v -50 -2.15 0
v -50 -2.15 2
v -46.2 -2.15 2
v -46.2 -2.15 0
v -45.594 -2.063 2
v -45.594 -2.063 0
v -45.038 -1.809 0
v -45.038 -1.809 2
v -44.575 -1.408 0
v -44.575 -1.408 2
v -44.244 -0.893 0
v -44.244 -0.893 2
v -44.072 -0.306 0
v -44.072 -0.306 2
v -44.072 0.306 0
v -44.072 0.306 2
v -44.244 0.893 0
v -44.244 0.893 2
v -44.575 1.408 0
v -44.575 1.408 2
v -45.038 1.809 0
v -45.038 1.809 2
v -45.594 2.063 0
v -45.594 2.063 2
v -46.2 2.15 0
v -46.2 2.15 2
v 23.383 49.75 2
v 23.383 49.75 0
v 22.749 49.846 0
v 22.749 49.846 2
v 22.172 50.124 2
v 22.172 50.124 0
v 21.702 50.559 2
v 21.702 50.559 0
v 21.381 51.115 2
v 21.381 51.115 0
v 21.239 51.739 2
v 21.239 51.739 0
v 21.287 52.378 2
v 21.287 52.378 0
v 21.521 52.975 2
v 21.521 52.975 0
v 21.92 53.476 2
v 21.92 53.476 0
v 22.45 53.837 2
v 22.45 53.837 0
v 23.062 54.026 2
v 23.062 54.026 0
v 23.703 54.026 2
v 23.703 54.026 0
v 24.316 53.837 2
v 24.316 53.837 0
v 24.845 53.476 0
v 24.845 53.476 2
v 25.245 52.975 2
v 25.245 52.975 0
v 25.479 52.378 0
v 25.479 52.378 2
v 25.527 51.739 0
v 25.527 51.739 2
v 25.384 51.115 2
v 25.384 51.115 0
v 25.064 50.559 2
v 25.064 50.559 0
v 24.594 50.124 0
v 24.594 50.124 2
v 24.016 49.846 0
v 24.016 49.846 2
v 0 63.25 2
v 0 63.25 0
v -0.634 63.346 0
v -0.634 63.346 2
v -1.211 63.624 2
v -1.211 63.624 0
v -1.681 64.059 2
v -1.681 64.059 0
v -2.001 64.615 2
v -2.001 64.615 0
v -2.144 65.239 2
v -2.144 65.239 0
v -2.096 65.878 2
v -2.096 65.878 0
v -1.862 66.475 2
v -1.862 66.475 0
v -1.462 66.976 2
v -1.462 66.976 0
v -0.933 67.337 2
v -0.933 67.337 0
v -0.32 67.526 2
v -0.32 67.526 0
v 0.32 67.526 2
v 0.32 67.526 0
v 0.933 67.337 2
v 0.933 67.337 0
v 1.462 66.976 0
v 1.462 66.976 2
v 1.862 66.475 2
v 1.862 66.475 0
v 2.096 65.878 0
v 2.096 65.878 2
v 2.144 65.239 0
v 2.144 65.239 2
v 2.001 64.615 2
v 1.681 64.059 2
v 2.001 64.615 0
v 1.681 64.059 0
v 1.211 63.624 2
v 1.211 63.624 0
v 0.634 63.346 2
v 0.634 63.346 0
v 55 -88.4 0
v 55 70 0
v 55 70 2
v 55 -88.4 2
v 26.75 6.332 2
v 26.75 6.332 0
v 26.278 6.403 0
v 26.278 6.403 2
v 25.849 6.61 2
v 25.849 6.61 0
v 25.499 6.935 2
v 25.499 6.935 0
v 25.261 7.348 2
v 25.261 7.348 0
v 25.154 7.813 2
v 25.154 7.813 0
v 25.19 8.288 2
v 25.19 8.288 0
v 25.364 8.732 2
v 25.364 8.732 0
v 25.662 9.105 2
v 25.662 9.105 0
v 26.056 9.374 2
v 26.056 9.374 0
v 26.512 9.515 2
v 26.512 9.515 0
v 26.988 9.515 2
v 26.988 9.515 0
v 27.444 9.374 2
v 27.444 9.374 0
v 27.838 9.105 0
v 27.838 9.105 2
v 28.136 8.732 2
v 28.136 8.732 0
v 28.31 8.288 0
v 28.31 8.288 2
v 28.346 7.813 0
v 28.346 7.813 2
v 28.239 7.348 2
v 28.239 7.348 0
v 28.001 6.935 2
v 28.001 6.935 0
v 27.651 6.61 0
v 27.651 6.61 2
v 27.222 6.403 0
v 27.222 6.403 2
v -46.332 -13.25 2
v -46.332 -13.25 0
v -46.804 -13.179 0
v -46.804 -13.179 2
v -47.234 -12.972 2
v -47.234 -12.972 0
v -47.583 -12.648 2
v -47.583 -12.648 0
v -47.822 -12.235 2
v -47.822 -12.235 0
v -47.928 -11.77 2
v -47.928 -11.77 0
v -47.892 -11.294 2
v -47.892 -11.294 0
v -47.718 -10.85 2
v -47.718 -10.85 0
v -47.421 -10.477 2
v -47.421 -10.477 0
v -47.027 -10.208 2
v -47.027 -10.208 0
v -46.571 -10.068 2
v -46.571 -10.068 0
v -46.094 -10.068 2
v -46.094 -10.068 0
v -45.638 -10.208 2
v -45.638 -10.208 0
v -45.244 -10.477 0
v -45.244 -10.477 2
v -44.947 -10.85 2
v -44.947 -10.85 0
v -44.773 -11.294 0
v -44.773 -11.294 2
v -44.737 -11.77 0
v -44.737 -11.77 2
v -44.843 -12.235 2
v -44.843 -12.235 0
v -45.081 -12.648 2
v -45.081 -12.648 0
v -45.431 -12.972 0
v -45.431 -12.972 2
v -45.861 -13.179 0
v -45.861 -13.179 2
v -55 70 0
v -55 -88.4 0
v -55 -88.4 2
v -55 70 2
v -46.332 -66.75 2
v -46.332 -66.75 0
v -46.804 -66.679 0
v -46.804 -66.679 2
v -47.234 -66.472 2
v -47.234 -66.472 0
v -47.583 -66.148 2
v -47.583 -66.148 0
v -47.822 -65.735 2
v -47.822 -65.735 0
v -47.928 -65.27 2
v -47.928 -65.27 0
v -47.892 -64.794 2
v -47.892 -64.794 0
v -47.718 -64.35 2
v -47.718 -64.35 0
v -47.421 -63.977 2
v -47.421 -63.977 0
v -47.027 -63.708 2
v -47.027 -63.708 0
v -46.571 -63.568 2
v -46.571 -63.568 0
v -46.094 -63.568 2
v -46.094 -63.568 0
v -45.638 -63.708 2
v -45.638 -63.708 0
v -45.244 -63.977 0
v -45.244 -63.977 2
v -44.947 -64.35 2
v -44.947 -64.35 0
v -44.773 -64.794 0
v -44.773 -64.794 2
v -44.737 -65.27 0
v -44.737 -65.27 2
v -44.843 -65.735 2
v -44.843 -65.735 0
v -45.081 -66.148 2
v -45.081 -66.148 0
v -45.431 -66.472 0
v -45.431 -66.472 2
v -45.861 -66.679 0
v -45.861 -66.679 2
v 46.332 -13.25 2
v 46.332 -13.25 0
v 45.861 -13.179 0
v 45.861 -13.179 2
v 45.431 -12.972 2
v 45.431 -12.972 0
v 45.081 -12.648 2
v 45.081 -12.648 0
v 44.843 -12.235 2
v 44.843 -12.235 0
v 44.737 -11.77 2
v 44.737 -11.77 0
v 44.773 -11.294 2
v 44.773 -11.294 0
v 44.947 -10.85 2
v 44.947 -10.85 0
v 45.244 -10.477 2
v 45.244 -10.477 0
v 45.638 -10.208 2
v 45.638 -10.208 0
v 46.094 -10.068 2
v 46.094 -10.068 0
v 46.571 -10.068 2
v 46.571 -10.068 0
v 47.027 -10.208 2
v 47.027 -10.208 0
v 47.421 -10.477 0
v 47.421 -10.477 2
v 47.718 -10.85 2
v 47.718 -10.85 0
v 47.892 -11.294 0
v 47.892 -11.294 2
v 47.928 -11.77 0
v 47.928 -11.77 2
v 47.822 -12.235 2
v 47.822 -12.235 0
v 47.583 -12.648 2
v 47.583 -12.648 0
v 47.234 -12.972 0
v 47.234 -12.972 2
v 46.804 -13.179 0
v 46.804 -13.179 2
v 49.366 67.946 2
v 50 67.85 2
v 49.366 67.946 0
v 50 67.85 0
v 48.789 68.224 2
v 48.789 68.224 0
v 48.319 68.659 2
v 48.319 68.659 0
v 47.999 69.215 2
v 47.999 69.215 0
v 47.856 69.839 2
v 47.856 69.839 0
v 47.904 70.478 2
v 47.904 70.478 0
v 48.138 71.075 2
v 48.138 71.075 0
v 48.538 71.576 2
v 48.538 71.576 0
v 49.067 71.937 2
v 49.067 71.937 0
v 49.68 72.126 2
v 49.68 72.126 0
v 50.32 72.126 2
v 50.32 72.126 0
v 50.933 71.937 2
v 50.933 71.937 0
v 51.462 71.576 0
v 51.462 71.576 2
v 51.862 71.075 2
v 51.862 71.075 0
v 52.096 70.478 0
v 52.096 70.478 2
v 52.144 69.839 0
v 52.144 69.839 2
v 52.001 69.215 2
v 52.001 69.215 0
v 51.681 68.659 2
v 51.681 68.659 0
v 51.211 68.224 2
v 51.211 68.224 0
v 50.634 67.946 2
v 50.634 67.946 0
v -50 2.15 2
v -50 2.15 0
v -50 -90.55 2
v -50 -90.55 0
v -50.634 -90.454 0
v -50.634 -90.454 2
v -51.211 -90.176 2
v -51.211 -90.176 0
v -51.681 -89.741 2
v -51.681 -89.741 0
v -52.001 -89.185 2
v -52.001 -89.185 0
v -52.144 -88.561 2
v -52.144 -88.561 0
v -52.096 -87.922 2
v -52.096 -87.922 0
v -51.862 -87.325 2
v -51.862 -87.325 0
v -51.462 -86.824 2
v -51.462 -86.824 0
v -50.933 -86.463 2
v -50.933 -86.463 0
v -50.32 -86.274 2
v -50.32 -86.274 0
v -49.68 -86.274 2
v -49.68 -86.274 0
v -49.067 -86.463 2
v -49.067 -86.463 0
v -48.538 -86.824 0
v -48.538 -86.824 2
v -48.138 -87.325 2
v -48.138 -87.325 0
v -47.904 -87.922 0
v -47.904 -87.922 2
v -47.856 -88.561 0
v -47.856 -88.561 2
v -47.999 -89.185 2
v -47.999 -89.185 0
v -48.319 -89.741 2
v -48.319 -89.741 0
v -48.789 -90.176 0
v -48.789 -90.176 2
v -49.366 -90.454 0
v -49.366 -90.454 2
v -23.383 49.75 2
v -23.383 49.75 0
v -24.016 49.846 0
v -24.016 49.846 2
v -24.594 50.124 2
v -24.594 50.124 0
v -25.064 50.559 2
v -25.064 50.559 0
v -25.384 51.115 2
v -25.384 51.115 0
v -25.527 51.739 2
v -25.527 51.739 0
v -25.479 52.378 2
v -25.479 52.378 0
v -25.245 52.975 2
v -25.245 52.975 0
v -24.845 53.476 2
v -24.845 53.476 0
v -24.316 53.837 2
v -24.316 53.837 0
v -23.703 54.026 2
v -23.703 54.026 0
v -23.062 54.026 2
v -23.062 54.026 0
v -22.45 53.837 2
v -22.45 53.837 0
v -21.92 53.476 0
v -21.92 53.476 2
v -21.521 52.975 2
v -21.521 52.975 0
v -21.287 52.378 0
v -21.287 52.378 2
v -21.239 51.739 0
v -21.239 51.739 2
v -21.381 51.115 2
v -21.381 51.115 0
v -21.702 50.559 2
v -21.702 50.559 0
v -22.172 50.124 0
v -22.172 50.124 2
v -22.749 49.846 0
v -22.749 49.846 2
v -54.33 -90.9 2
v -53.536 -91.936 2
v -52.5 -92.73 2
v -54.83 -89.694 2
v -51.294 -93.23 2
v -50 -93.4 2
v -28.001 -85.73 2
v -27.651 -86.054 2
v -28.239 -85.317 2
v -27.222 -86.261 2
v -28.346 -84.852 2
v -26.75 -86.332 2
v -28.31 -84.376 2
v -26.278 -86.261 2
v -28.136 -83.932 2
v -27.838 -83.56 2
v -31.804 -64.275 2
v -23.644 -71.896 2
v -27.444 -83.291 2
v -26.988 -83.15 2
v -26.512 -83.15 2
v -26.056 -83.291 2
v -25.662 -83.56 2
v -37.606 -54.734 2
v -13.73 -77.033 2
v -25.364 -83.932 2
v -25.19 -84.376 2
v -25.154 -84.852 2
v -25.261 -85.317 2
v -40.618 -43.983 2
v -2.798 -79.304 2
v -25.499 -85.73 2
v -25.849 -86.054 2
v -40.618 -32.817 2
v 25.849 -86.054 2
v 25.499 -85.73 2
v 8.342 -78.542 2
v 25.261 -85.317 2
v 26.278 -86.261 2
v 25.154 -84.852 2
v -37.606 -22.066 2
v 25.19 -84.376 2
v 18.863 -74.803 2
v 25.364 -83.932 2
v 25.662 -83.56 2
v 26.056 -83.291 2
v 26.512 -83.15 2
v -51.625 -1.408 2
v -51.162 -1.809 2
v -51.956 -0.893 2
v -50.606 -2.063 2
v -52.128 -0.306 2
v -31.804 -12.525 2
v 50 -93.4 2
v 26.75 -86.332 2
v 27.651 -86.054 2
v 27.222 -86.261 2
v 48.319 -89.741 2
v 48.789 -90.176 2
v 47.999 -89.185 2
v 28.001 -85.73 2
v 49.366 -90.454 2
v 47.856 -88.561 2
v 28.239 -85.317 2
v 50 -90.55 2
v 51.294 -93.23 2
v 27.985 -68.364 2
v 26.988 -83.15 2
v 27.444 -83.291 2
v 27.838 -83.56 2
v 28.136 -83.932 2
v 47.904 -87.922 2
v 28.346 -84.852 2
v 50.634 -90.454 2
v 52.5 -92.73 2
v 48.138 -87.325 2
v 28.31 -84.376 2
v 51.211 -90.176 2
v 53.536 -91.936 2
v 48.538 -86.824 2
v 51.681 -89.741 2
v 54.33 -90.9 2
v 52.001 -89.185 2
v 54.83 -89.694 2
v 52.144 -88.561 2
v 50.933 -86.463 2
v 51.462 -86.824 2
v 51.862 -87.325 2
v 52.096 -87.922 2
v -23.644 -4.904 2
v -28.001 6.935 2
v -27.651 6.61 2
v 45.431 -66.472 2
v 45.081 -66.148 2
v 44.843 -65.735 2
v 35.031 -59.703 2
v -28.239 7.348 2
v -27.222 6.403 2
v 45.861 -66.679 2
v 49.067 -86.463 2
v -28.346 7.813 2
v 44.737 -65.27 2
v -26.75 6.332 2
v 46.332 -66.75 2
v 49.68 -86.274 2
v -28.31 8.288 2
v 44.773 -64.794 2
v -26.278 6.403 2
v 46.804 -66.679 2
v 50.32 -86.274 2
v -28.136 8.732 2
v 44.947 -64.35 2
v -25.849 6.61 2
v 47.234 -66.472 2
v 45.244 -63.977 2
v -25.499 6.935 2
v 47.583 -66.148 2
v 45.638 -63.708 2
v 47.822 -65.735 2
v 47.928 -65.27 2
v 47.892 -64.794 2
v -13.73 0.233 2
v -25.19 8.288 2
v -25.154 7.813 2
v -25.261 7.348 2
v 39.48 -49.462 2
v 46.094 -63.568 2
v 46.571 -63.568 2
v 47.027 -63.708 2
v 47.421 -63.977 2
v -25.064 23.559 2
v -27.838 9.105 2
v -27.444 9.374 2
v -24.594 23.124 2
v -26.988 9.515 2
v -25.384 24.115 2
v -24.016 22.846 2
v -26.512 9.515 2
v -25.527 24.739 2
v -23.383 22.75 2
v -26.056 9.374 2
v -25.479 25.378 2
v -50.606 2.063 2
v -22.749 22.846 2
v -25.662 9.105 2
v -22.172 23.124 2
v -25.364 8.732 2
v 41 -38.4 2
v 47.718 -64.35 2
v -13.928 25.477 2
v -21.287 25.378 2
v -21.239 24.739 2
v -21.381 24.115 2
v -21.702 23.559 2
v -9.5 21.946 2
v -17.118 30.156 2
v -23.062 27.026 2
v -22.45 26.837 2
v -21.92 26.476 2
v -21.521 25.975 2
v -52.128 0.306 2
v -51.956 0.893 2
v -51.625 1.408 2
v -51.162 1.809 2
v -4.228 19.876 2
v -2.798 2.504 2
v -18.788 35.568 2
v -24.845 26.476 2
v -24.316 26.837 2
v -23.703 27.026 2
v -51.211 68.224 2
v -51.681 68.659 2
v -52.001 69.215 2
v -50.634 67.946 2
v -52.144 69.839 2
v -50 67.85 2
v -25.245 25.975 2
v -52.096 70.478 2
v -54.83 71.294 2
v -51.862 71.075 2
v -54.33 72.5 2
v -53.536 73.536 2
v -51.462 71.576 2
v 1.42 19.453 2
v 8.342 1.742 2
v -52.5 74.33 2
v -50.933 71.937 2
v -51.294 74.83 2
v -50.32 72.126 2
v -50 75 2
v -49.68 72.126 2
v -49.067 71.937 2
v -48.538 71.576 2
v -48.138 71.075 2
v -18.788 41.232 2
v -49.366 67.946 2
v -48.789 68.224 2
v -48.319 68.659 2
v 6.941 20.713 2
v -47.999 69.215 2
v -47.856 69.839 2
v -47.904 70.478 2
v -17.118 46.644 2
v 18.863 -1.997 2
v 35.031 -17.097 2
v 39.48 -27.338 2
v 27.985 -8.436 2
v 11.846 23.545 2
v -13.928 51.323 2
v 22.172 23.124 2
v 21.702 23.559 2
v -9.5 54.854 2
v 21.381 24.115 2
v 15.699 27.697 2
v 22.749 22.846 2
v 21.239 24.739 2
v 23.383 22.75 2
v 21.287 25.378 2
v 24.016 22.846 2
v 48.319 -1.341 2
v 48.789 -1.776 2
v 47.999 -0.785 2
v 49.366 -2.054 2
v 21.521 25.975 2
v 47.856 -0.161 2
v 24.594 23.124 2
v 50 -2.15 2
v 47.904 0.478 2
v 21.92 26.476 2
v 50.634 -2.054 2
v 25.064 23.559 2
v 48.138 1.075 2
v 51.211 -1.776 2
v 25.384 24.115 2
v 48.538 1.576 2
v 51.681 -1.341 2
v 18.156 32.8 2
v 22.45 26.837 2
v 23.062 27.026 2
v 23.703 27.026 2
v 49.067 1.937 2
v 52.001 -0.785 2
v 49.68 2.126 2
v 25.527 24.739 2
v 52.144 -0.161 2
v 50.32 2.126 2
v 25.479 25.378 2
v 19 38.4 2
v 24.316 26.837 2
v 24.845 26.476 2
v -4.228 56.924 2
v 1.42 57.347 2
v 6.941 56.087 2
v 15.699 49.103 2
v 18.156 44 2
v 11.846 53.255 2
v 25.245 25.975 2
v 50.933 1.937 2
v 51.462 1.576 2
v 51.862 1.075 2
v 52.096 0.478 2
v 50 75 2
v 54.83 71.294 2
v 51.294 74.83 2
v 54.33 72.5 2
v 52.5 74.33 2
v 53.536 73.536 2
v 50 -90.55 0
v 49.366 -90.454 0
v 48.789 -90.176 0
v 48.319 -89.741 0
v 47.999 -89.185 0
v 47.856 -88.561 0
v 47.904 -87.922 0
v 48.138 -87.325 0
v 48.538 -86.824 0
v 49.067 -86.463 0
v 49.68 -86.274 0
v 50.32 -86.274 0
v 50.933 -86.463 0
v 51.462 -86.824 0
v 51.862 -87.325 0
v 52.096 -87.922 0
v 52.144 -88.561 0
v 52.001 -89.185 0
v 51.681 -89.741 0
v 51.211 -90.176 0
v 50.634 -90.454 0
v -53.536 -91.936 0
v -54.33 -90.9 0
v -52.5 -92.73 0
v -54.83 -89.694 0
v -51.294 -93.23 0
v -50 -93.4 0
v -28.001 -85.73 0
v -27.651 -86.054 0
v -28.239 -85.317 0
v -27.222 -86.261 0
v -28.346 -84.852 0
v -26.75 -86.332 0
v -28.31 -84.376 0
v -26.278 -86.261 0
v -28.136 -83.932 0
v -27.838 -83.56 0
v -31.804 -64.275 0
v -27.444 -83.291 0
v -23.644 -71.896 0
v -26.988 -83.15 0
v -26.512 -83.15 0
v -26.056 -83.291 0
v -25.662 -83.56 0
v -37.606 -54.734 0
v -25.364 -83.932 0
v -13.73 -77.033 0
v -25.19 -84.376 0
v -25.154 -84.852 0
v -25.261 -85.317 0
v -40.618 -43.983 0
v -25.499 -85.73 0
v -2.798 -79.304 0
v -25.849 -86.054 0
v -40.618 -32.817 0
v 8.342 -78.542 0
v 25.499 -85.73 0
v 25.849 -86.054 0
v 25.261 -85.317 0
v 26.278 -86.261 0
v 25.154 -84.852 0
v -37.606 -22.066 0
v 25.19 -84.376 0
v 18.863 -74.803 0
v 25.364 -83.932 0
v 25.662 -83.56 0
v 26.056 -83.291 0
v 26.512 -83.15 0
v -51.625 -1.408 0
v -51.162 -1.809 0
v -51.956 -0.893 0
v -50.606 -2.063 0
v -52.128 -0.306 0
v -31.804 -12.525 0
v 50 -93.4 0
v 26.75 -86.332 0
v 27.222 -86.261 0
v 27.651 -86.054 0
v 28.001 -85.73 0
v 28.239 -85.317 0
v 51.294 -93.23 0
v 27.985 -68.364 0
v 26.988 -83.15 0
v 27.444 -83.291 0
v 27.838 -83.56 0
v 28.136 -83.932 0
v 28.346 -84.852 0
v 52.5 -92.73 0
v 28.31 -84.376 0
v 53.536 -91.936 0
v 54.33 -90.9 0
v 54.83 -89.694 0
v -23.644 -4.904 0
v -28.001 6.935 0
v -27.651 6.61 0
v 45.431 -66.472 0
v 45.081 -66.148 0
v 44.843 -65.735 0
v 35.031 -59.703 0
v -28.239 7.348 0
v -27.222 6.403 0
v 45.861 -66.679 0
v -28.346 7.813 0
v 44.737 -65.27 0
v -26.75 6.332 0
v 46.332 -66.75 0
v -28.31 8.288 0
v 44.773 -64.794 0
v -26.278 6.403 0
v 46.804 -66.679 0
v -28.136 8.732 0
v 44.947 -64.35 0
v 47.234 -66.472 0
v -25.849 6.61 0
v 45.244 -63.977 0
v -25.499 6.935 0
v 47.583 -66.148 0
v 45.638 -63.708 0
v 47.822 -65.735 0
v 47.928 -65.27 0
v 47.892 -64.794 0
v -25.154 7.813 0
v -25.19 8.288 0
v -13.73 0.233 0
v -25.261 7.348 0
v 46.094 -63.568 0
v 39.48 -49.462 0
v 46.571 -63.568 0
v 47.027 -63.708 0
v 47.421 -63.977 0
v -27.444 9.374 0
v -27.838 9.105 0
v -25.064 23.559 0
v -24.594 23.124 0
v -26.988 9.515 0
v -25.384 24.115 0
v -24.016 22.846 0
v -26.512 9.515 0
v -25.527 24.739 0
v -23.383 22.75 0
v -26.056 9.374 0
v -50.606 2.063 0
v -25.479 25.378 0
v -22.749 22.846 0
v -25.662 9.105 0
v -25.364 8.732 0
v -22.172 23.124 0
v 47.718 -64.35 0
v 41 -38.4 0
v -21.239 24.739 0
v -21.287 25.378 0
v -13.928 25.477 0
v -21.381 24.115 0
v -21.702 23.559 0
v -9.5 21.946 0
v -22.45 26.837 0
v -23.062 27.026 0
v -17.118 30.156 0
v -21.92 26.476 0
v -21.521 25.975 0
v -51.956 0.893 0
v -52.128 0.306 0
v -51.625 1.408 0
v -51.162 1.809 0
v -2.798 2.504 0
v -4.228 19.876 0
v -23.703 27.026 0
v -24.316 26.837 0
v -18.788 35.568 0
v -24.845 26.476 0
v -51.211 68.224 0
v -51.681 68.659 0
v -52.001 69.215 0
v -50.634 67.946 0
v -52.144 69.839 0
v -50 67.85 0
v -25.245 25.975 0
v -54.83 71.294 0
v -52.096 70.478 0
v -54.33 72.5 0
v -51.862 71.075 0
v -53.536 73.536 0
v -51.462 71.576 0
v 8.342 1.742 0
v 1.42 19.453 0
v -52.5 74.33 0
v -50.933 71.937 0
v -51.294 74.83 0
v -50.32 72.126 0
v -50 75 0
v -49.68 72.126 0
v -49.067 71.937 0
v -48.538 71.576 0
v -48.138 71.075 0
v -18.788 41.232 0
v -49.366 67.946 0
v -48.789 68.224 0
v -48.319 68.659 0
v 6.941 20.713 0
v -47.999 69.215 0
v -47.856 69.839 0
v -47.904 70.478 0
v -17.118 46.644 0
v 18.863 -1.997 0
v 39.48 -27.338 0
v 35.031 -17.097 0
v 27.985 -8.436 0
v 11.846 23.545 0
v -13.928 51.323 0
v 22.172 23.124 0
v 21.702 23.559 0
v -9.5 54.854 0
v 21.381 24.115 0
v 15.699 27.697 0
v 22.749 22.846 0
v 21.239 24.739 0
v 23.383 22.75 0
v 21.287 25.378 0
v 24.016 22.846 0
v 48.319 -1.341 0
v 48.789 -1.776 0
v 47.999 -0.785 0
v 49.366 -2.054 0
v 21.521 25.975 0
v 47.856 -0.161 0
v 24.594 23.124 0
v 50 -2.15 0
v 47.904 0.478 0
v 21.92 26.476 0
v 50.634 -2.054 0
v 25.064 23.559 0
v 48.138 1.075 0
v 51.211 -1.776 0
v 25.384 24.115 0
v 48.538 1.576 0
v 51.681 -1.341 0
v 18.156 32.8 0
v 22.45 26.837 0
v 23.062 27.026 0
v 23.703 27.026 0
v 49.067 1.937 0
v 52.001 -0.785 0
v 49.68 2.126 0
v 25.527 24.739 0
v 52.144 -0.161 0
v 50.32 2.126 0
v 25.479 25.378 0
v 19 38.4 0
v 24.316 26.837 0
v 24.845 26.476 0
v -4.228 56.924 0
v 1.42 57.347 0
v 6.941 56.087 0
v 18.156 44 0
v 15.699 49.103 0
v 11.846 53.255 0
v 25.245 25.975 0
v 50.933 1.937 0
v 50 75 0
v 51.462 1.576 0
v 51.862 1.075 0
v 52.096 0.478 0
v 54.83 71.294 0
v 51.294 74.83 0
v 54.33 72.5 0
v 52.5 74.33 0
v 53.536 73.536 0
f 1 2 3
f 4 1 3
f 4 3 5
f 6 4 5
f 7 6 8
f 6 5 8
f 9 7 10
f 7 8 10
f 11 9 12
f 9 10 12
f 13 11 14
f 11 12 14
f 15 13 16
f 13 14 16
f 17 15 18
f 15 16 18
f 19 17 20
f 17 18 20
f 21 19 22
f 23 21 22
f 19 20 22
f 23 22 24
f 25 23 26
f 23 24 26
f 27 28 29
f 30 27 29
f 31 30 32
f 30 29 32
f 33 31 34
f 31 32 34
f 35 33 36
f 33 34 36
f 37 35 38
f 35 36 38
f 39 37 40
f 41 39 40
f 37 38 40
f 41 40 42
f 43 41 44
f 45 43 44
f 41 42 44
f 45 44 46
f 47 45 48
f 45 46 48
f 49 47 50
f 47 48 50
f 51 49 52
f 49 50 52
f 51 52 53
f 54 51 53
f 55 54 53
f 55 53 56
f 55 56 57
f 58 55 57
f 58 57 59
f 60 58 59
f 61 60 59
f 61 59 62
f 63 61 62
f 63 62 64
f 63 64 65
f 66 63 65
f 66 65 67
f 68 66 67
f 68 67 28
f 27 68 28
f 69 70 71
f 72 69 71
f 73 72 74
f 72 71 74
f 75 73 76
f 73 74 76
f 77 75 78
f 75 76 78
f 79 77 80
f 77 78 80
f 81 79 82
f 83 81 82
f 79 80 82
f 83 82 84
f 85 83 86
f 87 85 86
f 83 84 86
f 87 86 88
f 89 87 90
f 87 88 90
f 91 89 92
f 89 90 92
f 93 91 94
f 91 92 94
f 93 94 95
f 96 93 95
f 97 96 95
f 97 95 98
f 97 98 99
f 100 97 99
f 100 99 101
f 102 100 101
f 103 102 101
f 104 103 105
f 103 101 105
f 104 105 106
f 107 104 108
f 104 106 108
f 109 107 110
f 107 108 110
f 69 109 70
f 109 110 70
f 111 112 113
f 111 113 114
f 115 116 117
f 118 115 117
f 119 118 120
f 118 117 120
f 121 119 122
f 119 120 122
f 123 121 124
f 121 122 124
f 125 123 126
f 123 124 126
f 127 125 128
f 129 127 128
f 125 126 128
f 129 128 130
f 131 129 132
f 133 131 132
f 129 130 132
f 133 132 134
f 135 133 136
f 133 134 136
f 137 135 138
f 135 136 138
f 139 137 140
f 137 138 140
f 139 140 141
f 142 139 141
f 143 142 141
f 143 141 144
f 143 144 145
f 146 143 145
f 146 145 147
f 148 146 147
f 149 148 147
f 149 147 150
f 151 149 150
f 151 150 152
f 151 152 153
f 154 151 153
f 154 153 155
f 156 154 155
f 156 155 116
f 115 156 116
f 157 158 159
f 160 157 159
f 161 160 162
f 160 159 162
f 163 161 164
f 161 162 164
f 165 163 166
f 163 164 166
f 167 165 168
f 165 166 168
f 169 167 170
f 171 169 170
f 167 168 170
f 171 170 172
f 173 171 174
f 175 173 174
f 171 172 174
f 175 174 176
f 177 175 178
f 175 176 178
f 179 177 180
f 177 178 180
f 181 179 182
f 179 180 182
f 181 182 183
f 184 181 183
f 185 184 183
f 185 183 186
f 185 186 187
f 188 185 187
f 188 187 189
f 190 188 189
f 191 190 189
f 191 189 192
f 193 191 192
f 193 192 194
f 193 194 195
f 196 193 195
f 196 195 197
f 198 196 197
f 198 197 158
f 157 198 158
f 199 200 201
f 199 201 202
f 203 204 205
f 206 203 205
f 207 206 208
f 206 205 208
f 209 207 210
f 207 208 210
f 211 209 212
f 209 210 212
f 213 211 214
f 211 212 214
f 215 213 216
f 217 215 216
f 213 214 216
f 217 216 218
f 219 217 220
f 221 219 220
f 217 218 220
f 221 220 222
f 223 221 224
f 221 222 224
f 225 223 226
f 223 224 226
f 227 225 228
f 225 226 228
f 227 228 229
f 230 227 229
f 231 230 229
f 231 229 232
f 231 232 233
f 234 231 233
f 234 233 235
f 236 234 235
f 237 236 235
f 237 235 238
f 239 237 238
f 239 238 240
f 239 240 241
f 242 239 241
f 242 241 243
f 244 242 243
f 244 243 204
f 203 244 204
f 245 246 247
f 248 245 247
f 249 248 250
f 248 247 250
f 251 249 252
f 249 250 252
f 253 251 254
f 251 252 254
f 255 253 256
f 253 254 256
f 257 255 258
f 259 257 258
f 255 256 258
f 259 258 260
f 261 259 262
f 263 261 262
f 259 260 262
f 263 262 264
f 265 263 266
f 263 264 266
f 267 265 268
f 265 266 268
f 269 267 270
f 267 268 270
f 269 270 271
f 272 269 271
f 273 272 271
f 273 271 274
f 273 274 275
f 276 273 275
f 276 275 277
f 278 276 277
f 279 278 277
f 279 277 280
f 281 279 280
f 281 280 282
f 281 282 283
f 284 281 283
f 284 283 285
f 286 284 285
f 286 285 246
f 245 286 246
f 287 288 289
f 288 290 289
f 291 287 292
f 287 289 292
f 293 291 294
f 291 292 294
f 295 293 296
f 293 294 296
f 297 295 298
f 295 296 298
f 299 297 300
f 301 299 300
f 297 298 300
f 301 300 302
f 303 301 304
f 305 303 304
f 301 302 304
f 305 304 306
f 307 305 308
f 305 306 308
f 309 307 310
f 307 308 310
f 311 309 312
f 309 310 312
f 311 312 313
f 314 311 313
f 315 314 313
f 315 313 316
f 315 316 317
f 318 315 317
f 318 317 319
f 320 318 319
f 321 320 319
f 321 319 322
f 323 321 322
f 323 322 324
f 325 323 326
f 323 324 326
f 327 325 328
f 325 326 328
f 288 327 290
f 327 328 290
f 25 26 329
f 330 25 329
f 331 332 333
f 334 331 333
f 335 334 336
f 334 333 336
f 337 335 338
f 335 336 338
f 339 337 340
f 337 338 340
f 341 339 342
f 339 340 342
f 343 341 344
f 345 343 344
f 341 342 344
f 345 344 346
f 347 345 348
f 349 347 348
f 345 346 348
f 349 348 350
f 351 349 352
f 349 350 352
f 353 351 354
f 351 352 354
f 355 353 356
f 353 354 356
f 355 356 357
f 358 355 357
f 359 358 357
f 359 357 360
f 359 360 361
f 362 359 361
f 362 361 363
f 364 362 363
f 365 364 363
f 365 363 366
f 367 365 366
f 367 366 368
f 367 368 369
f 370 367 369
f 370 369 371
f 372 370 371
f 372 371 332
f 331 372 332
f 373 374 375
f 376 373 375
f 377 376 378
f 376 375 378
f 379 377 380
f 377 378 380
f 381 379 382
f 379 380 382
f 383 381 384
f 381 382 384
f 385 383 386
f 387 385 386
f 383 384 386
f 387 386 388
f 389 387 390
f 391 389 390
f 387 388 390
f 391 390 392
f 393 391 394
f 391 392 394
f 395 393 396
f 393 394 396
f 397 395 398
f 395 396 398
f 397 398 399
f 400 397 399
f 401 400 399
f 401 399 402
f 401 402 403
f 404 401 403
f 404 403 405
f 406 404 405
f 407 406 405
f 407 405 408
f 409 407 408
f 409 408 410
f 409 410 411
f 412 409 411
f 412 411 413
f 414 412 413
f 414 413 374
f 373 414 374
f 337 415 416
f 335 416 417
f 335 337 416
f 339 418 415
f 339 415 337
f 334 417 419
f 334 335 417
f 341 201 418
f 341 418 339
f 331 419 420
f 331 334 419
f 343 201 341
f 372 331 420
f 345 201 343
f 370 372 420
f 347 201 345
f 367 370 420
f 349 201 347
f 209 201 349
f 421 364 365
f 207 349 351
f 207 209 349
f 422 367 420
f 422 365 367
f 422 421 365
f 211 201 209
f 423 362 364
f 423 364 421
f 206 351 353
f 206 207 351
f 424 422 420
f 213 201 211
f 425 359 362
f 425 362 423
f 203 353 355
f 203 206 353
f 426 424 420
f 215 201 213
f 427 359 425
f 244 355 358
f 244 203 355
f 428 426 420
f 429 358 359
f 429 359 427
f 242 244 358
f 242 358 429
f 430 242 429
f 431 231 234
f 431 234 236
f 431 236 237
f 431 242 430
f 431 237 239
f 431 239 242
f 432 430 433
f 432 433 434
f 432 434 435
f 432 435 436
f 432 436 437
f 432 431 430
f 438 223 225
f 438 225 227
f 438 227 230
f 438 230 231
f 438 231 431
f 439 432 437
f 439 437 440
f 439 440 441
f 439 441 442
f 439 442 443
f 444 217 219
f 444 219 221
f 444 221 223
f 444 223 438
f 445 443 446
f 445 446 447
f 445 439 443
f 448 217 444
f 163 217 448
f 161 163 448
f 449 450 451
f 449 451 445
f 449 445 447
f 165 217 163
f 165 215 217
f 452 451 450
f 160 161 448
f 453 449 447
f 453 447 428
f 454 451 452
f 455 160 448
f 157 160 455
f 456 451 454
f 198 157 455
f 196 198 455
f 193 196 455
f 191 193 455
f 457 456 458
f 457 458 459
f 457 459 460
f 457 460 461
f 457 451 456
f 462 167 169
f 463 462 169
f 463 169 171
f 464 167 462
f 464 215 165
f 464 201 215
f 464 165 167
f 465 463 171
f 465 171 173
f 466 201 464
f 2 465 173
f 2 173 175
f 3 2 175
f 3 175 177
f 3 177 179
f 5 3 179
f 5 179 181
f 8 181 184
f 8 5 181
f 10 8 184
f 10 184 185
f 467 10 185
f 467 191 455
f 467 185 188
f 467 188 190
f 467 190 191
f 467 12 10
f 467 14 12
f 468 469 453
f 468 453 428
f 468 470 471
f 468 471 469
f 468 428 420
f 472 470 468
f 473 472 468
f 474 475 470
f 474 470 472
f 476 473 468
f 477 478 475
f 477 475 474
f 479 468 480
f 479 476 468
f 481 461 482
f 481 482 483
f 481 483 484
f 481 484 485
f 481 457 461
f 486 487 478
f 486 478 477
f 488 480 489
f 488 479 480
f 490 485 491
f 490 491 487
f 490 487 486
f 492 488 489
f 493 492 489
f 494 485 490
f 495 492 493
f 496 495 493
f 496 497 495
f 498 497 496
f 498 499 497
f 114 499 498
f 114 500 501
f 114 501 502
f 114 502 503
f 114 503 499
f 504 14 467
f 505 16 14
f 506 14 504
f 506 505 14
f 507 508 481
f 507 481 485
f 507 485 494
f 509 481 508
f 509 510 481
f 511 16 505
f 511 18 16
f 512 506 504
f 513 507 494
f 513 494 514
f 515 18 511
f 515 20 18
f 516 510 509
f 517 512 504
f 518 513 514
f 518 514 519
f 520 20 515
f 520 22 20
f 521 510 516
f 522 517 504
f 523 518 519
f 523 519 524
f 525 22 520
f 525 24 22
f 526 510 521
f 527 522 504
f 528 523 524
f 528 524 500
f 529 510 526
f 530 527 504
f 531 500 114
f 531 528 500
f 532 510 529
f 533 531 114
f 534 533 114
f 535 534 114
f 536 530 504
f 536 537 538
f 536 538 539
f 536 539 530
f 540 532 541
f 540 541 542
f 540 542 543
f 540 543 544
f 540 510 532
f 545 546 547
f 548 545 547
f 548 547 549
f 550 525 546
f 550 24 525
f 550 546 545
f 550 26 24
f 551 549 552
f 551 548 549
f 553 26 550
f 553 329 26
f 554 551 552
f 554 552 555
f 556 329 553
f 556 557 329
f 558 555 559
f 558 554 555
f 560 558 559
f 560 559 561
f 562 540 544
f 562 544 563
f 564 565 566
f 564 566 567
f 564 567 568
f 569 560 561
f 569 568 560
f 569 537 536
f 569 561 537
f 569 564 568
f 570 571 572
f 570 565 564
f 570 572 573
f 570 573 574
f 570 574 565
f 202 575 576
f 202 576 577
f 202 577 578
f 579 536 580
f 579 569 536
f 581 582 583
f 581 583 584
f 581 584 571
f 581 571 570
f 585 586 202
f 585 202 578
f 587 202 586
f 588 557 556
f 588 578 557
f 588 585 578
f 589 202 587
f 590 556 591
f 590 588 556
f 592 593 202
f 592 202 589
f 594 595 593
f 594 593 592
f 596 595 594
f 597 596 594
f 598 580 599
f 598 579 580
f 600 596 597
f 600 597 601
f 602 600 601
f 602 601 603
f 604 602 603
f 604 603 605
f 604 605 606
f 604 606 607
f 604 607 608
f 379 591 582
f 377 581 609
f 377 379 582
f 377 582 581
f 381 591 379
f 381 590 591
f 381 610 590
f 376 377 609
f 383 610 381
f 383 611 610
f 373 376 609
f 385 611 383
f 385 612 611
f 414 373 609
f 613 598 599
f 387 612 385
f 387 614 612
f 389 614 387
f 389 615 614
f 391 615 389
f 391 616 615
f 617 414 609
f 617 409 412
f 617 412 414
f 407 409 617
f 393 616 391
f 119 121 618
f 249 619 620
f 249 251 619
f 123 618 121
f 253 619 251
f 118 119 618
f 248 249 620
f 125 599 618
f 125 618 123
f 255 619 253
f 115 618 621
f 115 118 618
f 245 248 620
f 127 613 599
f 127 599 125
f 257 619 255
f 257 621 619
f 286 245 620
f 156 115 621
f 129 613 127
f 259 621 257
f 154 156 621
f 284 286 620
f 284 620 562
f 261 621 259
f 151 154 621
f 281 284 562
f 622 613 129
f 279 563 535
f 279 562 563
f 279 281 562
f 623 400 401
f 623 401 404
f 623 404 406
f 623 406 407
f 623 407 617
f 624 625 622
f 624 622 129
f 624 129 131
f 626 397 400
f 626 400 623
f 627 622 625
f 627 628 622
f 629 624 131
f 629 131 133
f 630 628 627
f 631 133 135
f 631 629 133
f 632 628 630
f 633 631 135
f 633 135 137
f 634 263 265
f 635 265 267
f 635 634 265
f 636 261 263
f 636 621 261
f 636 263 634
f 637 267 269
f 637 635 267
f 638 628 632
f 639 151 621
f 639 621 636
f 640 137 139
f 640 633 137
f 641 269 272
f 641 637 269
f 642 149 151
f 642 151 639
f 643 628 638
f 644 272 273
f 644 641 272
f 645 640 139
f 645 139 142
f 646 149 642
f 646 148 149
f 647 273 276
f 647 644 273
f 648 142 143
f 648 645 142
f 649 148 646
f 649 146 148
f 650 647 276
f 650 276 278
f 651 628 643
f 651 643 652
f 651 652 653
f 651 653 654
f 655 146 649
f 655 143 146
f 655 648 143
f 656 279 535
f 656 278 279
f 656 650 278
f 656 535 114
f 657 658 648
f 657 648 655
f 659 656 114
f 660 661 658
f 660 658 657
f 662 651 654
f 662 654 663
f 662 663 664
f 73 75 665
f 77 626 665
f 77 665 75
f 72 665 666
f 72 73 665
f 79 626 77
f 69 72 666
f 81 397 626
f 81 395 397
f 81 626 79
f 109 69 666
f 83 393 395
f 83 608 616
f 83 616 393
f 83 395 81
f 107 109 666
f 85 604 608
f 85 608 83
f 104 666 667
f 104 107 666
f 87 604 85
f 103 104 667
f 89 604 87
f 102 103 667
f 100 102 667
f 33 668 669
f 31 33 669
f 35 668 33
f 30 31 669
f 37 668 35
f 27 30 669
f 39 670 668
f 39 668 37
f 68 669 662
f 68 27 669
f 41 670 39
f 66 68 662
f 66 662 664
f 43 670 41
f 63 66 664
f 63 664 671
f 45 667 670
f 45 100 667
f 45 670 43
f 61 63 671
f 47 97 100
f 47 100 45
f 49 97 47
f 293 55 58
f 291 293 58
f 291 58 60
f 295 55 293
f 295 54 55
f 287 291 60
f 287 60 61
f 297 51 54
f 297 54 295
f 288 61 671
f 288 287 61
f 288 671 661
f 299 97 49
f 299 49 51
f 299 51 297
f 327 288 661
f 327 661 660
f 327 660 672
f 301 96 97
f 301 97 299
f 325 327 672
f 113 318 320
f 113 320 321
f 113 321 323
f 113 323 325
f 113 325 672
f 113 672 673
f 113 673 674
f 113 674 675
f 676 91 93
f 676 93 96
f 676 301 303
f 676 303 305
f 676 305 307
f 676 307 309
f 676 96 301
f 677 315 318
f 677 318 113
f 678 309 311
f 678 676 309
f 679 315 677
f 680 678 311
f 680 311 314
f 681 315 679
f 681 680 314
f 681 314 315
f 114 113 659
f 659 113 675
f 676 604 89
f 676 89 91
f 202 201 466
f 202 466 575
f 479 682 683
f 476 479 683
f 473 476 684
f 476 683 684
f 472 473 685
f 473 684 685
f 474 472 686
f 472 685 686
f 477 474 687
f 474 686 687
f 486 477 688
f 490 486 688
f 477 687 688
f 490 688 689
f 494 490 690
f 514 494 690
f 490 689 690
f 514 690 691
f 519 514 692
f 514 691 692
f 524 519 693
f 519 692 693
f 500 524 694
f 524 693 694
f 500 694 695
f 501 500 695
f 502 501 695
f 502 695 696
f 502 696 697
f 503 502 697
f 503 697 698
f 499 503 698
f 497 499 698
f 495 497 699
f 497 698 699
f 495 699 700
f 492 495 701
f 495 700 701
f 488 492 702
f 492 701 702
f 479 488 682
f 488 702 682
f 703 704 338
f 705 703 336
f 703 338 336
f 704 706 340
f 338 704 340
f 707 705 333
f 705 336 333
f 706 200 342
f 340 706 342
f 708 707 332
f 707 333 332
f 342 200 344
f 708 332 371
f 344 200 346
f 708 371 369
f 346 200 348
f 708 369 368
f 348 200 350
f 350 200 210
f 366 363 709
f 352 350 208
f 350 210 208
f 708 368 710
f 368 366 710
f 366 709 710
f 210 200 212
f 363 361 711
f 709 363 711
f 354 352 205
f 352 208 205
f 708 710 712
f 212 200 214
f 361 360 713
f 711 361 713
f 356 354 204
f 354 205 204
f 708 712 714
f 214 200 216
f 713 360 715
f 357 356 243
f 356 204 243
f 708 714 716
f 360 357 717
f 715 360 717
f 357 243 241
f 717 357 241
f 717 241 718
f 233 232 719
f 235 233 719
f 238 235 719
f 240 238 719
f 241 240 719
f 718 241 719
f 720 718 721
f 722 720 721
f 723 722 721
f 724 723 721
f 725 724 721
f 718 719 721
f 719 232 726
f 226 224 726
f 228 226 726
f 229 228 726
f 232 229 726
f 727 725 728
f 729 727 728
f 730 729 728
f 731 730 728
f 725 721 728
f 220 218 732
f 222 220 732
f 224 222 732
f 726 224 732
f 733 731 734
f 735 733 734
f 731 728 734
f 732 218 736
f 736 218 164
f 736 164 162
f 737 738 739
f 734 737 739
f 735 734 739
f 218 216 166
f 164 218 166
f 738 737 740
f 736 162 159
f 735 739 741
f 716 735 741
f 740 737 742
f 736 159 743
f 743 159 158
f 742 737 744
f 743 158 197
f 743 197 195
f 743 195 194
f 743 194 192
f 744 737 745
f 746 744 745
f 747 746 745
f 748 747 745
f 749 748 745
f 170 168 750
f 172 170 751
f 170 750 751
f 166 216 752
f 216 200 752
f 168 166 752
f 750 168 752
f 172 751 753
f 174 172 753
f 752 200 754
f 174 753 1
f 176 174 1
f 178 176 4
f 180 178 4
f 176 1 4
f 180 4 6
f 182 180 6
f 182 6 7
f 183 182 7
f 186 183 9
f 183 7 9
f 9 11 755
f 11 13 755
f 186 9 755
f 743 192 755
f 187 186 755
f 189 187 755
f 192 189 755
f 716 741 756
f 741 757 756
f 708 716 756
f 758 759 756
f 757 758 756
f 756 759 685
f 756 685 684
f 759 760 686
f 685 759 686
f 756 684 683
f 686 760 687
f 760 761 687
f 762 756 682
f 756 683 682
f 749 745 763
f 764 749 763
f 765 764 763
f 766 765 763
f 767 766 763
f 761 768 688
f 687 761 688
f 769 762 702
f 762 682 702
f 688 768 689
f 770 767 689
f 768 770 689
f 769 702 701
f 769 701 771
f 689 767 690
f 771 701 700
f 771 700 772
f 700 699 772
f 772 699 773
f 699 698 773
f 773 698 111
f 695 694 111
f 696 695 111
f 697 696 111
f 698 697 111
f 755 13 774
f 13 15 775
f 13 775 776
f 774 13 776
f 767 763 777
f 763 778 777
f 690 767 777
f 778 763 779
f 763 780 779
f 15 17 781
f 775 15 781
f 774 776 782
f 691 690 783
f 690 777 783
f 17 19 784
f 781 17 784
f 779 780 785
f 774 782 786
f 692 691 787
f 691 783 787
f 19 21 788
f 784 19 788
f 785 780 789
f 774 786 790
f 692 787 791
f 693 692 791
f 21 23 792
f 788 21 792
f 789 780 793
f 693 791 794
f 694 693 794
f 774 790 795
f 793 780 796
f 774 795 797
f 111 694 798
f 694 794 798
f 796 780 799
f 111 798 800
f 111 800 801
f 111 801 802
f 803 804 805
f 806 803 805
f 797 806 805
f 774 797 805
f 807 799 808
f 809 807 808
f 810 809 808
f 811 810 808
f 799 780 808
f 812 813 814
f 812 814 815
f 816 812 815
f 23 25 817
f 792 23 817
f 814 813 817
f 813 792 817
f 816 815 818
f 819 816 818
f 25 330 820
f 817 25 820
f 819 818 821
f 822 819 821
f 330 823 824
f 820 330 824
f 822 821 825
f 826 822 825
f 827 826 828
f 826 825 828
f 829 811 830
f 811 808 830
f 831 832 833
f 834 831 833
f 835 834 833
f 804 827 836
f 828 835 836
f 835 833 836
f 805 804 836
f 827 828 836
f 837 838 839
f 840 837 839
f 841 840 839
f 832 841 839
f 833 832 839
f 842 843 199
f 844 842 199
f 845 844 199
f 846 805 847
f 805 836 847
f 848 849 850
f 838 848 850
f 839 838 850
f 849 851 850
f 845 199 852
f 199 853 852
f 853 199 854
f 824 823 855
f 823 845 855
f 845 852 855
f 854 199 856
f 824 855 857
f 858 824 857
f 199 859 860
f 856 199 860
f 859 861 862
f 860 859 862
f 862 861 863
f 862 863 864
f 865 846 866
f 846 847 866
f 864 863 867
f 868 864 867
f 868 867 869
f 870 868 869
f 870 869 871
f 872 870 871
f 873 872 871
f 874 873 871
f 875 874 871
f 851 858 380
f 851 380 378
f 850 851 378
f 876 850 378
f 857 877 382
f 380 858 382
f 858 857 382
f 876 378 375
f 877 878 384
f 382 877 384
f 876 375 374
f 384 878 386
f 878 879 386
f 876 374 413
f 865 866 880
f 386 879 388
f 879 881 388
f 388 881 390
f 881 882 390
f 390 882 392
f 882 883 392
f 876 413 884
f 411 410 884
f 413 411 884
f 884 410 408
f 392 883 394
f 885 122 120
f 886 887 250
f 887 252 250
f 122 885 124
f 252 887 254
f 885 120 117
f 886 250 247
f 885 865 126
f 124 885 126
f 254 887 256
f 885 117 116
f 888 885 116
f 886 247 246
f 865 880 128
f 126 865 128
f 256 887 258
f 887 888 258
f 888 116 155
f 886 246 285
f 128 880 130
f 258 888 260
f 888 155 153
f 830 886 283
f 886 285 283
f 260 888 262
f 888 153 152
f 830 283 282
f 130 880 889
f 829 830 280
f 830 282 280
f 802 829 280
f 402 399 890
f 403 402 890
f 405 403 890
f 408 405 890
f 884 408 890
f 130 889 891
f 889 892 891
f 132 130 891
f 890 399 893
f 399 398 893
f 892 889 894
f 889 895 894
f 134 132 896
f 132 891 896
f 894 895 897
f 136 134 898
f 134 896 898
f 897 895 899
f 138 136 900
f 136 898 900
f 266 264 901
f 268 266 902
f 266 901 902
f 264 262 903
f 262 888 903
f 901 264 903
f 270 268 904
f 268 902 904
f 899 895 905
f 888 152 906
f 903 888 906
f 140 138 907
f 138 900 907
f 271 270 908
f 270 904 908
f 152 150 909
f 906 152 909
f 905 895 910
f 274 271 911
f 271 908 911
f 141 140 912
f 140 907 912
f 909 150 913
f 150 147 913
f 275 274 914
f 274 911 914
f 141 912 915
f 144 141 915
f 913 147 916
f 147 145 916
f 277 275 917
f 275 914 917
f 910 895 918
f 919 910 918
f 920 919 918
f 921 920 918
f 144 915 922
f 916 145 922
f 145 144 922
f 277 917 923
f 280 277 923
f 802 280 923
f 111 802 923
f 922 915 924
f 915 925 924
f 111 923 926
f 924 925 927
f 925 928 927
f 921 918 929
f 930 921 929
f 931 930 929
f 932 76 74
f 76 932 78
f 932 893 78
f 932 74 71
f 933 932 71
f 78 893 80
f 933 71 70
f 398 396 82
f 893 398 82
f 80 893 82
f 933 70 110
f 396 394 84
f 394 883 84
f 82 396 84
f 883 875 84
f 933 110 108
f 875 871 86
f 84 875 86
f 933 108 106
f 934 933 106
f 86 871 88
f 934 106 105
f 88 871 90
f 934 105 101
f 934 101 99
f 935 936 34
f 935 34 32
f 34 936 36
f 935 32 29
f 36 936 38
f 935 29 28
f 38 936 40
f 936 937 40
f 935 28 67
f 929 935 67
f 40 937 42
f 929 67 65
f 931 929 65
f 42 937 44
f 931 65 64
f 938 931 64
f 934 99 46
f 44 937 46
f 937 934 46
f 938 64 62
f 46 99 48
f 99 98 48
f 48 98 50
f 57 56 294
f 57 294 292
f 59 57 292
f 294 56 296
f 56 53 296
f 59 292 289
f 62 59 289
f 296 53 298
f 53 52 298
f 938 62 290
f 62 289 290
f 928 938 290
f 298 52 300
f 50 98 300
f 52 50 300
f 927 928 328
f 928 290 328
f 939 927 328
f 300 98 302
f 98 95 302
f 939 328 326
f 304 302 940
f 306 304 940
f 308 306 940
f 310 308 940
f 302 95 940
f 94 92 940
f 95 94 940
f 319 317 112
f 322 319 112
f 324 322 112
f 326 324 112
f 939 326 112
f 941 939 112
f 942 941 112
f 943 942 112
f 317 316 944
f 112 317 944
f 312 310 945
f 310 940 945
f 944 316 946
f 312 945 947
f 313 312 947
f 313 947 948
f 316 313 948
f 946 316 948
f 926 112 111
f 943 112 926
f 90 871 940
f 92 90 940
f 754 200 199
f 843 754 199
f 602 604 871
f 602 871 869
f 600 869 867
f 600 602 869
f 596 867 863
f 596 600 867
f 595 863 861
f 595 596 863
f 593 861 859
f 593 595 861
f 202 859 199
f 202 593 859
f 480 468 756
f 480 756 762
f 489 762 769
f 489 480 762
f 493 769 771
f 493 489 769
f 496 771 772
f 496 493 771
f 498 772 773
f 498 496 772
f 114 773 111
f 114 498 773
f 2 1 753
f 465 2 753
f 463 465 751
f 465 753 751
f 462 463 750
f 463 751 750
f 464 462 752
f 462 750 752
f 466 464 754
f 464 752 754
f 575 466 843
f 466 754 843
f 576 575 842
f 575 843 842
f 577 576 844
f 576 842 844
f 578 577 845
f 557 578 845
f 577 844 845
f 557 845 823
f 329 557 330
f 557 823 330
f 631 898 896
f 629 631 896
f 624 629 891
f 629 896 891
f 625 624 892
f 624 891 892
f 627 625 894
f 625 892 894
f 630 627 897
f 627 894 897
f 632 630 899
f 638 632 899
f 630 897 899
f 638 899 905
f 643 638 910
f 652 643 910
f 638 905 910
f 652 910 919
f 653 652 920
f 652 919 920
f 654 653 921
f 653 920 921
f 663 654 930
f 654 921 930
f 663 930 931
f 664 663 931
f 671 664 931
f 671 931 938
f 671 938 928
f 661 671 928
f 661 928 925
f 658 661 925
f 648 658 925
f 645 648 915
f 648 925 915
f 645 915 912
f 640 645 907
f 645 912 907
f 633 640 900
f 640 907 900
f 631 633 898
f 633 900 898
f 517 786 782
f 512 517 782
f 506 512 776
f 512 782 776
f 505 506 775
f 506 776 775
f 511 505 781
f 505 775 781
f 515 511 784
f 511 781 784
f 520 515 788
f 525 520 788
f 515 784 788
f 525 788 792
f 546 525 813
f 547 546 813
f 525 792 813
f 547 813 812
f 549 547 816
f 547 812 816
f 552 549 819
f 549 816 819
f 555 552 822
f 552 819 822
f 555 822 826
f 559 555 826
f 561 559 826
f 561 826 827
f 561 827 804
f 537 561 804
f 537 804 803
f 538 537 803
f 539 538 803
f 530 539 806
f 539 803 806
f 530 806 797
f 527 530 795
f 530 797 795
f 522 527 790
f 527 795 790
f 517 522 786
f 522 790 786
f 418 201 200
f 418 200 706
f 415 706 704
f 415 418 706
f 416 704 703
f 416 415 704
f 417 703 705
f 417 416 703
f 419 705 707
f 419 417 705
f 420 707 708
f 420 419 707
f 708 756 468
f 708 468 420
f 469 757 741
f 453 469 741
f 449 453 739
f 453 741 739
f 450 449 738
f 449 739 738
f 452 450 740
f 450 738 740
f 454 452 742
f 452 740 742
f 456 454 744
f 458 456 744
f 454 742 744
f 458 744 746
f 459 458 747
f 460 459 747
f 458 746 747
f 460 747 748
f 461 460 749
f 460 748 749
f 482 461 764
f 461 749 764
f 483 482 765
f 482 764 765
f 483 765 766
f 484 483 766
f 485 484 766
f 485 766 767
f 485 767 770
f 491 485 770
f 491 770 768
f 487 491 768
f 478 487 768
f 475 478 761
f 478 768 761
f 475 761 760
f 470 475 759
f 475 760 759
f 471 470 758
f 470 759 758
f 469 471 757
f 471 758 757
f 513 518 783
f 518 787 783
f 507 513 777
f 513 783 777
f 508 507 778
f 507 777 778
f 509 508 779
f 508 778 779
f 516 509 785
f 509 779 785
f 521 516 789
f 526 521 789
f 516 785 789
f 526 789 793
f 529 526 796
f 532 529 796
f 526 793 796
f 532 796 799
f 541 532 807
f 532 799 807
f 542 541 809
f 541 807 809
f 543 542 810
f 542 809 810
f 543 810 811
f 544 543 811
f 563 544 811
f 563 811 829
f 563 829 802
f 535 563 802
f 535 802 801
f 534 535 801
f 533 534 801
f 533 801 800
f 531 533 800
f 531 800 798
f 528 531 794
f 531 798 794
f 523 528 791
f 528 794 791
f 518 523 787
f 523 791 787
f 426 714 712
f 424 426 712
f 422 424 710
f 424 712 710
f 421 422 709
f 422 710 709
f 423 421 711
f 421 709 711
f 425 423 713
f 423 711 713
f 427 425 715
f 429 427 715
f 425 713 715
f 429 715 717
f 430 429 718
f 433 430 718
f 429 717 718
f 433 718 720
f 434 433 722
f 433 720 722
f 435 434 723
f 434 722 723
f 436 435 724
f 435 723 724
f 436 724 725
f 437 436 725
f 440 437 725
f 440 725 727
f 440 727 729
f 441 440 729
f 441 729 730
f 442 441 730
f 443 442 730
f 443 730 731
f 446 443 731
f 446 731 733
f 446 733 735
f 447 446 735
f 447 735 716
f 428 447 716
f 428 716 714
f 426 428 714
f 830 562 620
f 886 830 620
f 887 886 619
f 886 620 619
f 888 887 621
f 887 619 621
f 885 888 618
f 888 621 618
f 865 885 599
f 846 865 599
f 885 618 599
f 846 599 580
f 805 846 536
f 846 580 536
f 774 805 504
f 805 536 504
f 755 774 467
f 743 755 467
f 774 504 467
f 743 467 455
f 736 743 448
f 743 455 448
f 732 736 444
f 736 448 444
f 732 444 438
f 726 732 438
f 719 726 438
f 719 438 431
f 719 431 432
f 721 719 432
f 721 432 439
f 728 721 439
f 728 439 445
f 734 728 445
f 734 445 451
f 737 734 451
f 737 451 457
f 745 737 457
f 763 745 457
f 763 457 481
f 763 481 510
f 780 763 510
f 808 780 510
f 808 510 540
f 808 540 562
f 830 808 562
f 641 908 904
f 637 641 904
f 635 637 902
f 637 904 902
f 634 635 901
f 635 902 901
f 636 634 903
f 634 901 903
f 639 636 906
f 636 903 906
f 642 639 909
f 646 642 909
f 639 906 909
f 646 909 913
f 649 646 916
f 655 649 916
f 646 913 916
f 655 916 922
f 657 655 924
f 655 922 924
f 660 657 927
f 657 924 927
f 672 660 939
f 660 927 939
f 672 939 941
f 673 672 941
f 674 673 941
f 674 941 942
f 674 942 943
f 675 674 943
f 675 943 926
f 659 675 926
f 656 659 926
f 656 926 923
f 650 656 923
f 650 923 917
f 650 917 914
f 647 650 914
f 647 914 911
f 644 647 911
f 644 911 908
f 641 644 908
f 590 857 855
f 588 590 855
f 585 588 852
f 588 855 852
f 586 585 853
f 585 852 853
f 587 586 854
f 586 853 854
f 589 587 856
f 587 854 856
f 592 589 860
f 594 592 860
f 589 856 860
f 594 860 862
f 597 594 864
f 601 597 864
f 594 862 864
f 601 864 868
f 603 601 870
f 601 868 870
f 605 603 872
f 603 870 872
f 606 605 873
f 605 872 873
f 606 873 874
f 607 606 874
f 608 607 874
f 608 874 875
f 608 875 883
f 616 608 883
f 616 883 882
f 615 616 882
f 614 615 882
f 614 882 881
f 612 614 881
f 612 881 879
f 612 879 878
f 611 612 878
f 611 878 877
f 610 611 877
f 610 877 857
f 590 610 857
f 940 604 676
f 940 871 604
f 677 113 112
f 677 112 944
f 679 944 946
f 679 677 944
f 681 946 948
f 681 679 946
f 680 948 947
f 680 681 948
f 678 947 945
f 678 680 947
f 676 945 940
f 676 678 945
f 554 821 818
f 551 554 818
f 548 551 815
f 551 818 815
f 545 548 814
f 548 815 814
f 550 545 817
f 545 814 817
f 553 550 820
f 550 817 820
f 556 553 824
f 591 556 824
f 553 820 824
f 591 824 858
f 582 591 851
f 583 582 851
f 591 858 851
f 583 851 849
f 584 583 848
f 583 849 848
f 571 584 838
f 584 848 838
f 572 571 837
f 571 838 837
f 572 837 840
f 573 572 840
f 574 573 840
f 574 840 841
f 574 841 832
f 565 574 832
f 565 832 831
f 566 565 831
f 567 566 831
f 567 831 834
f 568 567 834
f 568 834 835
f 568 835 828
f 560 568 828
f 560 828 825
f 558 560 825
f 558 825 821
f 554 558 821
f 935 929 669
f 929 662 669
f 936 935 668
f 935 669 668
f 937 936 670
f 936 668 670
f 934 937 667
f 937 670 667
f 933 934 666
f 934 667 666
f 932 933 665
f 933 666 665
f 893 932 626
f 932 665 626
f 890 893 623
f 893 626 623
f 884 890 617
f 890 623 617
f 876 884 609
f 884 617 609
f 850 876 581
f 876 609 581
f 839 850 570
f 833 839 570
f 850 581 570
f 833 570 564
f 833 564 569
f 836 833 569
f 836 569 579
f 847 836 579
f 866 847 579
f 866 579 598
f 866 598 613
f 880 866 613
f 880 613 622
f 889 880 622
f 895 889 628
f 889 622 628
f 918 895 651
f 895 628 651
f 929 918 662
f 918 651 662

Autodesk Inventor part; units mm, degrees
ref_plane "YZ Plane" through (0, 0, 0) normal (1, 0, 0) x (0, 1, 0)
ref_plane "XZ Plane" through (0, 0, 0) normal (0, 1, 0) x (-1, 0, 0)
ref_plane "XY Plane" through (0, 0, 0) normal (0, 0, 1) x (1, 0, 0)
sketch "スケッチ1" plane through (0, 0, 0) normal (0, 0, 1) x (1, 0, 0)
  line L0 (55, -93.4) -> (-55, -93.4)
  line L1 (-55, -93.4) -> (-55, 75)
  line L2 (-55, 75) -> (55, 75)
  line L3 (55, 75) -> (55, -93.4)
  line L4 (55, -93.4) -> (-55, 75) construction
  line L5 (-55, -93.4) -> (55, 75) construction
  point P0 (0, 0)
  point P1 (0, -9.2)
  point P2 (0, -9.2)
  dimension "d50" = 93.4
  dimension "d51" = 110
  dimension "d52" = 75
extrude "プレート1" add sketch "スケッチ1" along normal blind 2
sketch "スケッチ3" plane through (0, 0, 2) normal (0, 0, 1) x (1, 0, 0)
  circle A0 centre (0, 38.4) radius 19
  circle A1 centre (0, -38.4) radius 10
  point P0 (0, 0)
  dimension "d22" = 38
  dimension "d53" = 20
  dimension "d55" = 76.8
  dimension "d56" = 38.4
extrude "押し出し1" cut sketch "スケッチ3" against normal blind 10 contours A0
sketch "スケッチ2" plane through (0, 0, 2) normal (0, 0, 1) x (1, 0, 0)
  circle A0 centre (0, 38.4) radius 15 construction
  circle A1 centre (0, -38.4) radius 53.5
  point P0 (0, 0)
  point P1 (0, 53.4)
  point P2 (-15, 38.4)
  point P3 (0, 23.4)
  point P4 (15, 38.4)
  point P5 (-46.3324, -11.65)
  point P6 (-53.5, -38.4)
  point P7 (-46.3324, -65.15)
  point P8 (-26.75, -84.7324)
  point P9 (0, -91.9)
  point P10 (26.75, -84.7324)
  point P11 (46.3324, -65.15)
  point P12 (53.5, -38.4)
  point P13 (46.3324, -11.65)
  point P14 (26.75, 7.9324)
  point P15 (0, 15.1)
  point P16 (-26.75, 7.9324)
  dimension "d3" = 30
  dimension "d8" = 107
  dimension "d6" = 360
  dimension "d11" = 360
  dimension "d13" = 76.8
  dimension "d14" = 38.4
  dimension "d58" = 0
hole "穴1" at (-26.75, -84.7324, 2) at (-46.3324, -65.15, 2) at (-26.75, 7.9324, 2) at (-46.3324, -11.65, 2) at (26.75, 7.9324, 2) at (46.3324, -11.65, 2) at (46.3324, -65.15, 2) at (26.75, -84.7324, 2) direction (0, 0, -1) diameter 3.2 end through all clearance for "Socket Head Cap Screw" size "M3" standard "Ansi Metric M Profile"
sketch "スケッチ4" plane through (0, 0, 2) normal (0, 0, 1) x (1, 0, 0)
  line L0 (55, -93.4) -> (-55, -93.4) projected
  line L1 (-55, -93.4) -> (-55, 75) projected
  line L2 (55, 75) -> (55, -93.4) projected
  line L3 (-55, 75) -> (55, 75) projected
  line L4 (-50, 70) -> (-50, -88.4)
  line L5 (-50, -88.4) -> (50, -88.4)
  line L6 (50, -88.4) -> (50, 70)
  line L7 (50, 70) -> (-50, 70)
  point P0 (-50, 0)
  point P1 (50, 0)
  point P2 (0, 0)
  dimension "d57" = 5
hole "穴2" at (-50, -88.4, 2) at (50, -88.4, 2) at (50, 70, 2) at (-50, 70, 2) at (-50, 0, 2) at (50, 0, 2) direction (0, 0, -1) diameter 4.3 end through all clearance for "Socket Head Cap Screw" size "M4" standard "Ansi Metric M Profile"
fillet "コーナーR1" radius 5 4 edges at (-55, -93.4, 1) (55, -93.4, 1) (55, 75, 1) (-55, 75, 1)
sketch "スケッチ5" plane through (0, 0, 2) normal (0, 0, 1) x (1, 0, 0)
  circle A0 centre (0, -38.4) radius 41
  point P0 (0, 0)
  dimension "d35" = 82
extrude "押し出し2" cut sketch "スケッチ5" against normal blind 10
sketch "スケッチ6" plane through (0, 0, 2) normal (0, 0, 1) x (1, 0, 0)
  circle A0 centre (0, 38.4) radius 19 projected
  circle A1 centre (0, 38.4) radius 27
  point P0 (0, 0)
  point P1 (-23.3827, 51.9)
  point P2 (-23.3827, 24.9)
  point P3 (0, 11.4)
  point P4 (23.3827, 24.9)
  point P5 (23.3827, 51.9)
  point P6 (0, 65.4)
  dimension "d38" = 54
  dimension "d41" = 360
  dimension "d59" = 0
hole "穴3" at (0, 65.4, 2) at (23.3827, 51.9, 2) at (23.3827, 24.9, 2) at (-23.3827, 24.9, 2) at (-23.3827, 51.9, 2) direction (0, 0, -1) diameter 4.3 end through all clearance for "Socket Head Cap Screw" size "M4" standard "Ansi Metric M Profile"
sketch "スケッチ7" plane through (0, 0, 2) normal (0, 0, 1) x (1, 0, 0)
  circle A0 centre (-50, 0) radius 2.15 projected
  line L0 (-46.2, 0) -> (-50, 0) construction
  line L1 (-46.2, 2.15) -> (-50, 2.15)
  line L2 (-50, -2.15) -> (-46.2, -2.15)
  arc A1 (-46.2, -2.15) -> (-46.2, 2.15) centre (-46.2, 0) ccw
  arc A2 (-50, 2.15) -> (-50, -2.15) centre (-50, 0) ccw
  point P0 (0, 0)
  point P1 (-48.1, 0)
  dimension "d60" = 48.1
extrude "押し出し3" cut sketch "スケッチ7" against normal through all
equation "\"d56\" = 0.5 * d55"
equation "\"d14\" = 0.5 * d13"
equation "\"d20\" = Thickness"
equation "\"d2\" = Thickness"
equation "\"BendRadius\" = Thickness"
equation "\"BendReliefWidth\" = Thickness"
equation "\"BendReliefDepth\" = 0.5 * Thickness"
equation "\"CornerReliefSize\" = 4 * Thickness"
equation "\"MinimumRemnant\" = 2 * Thickness"
equation "\"TransitionRadius\" = BendRadius"
equation "\"JacobiRadiusSize\" = BendRadius"
equation "\"GapSize\" = Thickness"
equation "\"Thickness\" = 2"
properties part number "carbonplate3" material "CFRP"
